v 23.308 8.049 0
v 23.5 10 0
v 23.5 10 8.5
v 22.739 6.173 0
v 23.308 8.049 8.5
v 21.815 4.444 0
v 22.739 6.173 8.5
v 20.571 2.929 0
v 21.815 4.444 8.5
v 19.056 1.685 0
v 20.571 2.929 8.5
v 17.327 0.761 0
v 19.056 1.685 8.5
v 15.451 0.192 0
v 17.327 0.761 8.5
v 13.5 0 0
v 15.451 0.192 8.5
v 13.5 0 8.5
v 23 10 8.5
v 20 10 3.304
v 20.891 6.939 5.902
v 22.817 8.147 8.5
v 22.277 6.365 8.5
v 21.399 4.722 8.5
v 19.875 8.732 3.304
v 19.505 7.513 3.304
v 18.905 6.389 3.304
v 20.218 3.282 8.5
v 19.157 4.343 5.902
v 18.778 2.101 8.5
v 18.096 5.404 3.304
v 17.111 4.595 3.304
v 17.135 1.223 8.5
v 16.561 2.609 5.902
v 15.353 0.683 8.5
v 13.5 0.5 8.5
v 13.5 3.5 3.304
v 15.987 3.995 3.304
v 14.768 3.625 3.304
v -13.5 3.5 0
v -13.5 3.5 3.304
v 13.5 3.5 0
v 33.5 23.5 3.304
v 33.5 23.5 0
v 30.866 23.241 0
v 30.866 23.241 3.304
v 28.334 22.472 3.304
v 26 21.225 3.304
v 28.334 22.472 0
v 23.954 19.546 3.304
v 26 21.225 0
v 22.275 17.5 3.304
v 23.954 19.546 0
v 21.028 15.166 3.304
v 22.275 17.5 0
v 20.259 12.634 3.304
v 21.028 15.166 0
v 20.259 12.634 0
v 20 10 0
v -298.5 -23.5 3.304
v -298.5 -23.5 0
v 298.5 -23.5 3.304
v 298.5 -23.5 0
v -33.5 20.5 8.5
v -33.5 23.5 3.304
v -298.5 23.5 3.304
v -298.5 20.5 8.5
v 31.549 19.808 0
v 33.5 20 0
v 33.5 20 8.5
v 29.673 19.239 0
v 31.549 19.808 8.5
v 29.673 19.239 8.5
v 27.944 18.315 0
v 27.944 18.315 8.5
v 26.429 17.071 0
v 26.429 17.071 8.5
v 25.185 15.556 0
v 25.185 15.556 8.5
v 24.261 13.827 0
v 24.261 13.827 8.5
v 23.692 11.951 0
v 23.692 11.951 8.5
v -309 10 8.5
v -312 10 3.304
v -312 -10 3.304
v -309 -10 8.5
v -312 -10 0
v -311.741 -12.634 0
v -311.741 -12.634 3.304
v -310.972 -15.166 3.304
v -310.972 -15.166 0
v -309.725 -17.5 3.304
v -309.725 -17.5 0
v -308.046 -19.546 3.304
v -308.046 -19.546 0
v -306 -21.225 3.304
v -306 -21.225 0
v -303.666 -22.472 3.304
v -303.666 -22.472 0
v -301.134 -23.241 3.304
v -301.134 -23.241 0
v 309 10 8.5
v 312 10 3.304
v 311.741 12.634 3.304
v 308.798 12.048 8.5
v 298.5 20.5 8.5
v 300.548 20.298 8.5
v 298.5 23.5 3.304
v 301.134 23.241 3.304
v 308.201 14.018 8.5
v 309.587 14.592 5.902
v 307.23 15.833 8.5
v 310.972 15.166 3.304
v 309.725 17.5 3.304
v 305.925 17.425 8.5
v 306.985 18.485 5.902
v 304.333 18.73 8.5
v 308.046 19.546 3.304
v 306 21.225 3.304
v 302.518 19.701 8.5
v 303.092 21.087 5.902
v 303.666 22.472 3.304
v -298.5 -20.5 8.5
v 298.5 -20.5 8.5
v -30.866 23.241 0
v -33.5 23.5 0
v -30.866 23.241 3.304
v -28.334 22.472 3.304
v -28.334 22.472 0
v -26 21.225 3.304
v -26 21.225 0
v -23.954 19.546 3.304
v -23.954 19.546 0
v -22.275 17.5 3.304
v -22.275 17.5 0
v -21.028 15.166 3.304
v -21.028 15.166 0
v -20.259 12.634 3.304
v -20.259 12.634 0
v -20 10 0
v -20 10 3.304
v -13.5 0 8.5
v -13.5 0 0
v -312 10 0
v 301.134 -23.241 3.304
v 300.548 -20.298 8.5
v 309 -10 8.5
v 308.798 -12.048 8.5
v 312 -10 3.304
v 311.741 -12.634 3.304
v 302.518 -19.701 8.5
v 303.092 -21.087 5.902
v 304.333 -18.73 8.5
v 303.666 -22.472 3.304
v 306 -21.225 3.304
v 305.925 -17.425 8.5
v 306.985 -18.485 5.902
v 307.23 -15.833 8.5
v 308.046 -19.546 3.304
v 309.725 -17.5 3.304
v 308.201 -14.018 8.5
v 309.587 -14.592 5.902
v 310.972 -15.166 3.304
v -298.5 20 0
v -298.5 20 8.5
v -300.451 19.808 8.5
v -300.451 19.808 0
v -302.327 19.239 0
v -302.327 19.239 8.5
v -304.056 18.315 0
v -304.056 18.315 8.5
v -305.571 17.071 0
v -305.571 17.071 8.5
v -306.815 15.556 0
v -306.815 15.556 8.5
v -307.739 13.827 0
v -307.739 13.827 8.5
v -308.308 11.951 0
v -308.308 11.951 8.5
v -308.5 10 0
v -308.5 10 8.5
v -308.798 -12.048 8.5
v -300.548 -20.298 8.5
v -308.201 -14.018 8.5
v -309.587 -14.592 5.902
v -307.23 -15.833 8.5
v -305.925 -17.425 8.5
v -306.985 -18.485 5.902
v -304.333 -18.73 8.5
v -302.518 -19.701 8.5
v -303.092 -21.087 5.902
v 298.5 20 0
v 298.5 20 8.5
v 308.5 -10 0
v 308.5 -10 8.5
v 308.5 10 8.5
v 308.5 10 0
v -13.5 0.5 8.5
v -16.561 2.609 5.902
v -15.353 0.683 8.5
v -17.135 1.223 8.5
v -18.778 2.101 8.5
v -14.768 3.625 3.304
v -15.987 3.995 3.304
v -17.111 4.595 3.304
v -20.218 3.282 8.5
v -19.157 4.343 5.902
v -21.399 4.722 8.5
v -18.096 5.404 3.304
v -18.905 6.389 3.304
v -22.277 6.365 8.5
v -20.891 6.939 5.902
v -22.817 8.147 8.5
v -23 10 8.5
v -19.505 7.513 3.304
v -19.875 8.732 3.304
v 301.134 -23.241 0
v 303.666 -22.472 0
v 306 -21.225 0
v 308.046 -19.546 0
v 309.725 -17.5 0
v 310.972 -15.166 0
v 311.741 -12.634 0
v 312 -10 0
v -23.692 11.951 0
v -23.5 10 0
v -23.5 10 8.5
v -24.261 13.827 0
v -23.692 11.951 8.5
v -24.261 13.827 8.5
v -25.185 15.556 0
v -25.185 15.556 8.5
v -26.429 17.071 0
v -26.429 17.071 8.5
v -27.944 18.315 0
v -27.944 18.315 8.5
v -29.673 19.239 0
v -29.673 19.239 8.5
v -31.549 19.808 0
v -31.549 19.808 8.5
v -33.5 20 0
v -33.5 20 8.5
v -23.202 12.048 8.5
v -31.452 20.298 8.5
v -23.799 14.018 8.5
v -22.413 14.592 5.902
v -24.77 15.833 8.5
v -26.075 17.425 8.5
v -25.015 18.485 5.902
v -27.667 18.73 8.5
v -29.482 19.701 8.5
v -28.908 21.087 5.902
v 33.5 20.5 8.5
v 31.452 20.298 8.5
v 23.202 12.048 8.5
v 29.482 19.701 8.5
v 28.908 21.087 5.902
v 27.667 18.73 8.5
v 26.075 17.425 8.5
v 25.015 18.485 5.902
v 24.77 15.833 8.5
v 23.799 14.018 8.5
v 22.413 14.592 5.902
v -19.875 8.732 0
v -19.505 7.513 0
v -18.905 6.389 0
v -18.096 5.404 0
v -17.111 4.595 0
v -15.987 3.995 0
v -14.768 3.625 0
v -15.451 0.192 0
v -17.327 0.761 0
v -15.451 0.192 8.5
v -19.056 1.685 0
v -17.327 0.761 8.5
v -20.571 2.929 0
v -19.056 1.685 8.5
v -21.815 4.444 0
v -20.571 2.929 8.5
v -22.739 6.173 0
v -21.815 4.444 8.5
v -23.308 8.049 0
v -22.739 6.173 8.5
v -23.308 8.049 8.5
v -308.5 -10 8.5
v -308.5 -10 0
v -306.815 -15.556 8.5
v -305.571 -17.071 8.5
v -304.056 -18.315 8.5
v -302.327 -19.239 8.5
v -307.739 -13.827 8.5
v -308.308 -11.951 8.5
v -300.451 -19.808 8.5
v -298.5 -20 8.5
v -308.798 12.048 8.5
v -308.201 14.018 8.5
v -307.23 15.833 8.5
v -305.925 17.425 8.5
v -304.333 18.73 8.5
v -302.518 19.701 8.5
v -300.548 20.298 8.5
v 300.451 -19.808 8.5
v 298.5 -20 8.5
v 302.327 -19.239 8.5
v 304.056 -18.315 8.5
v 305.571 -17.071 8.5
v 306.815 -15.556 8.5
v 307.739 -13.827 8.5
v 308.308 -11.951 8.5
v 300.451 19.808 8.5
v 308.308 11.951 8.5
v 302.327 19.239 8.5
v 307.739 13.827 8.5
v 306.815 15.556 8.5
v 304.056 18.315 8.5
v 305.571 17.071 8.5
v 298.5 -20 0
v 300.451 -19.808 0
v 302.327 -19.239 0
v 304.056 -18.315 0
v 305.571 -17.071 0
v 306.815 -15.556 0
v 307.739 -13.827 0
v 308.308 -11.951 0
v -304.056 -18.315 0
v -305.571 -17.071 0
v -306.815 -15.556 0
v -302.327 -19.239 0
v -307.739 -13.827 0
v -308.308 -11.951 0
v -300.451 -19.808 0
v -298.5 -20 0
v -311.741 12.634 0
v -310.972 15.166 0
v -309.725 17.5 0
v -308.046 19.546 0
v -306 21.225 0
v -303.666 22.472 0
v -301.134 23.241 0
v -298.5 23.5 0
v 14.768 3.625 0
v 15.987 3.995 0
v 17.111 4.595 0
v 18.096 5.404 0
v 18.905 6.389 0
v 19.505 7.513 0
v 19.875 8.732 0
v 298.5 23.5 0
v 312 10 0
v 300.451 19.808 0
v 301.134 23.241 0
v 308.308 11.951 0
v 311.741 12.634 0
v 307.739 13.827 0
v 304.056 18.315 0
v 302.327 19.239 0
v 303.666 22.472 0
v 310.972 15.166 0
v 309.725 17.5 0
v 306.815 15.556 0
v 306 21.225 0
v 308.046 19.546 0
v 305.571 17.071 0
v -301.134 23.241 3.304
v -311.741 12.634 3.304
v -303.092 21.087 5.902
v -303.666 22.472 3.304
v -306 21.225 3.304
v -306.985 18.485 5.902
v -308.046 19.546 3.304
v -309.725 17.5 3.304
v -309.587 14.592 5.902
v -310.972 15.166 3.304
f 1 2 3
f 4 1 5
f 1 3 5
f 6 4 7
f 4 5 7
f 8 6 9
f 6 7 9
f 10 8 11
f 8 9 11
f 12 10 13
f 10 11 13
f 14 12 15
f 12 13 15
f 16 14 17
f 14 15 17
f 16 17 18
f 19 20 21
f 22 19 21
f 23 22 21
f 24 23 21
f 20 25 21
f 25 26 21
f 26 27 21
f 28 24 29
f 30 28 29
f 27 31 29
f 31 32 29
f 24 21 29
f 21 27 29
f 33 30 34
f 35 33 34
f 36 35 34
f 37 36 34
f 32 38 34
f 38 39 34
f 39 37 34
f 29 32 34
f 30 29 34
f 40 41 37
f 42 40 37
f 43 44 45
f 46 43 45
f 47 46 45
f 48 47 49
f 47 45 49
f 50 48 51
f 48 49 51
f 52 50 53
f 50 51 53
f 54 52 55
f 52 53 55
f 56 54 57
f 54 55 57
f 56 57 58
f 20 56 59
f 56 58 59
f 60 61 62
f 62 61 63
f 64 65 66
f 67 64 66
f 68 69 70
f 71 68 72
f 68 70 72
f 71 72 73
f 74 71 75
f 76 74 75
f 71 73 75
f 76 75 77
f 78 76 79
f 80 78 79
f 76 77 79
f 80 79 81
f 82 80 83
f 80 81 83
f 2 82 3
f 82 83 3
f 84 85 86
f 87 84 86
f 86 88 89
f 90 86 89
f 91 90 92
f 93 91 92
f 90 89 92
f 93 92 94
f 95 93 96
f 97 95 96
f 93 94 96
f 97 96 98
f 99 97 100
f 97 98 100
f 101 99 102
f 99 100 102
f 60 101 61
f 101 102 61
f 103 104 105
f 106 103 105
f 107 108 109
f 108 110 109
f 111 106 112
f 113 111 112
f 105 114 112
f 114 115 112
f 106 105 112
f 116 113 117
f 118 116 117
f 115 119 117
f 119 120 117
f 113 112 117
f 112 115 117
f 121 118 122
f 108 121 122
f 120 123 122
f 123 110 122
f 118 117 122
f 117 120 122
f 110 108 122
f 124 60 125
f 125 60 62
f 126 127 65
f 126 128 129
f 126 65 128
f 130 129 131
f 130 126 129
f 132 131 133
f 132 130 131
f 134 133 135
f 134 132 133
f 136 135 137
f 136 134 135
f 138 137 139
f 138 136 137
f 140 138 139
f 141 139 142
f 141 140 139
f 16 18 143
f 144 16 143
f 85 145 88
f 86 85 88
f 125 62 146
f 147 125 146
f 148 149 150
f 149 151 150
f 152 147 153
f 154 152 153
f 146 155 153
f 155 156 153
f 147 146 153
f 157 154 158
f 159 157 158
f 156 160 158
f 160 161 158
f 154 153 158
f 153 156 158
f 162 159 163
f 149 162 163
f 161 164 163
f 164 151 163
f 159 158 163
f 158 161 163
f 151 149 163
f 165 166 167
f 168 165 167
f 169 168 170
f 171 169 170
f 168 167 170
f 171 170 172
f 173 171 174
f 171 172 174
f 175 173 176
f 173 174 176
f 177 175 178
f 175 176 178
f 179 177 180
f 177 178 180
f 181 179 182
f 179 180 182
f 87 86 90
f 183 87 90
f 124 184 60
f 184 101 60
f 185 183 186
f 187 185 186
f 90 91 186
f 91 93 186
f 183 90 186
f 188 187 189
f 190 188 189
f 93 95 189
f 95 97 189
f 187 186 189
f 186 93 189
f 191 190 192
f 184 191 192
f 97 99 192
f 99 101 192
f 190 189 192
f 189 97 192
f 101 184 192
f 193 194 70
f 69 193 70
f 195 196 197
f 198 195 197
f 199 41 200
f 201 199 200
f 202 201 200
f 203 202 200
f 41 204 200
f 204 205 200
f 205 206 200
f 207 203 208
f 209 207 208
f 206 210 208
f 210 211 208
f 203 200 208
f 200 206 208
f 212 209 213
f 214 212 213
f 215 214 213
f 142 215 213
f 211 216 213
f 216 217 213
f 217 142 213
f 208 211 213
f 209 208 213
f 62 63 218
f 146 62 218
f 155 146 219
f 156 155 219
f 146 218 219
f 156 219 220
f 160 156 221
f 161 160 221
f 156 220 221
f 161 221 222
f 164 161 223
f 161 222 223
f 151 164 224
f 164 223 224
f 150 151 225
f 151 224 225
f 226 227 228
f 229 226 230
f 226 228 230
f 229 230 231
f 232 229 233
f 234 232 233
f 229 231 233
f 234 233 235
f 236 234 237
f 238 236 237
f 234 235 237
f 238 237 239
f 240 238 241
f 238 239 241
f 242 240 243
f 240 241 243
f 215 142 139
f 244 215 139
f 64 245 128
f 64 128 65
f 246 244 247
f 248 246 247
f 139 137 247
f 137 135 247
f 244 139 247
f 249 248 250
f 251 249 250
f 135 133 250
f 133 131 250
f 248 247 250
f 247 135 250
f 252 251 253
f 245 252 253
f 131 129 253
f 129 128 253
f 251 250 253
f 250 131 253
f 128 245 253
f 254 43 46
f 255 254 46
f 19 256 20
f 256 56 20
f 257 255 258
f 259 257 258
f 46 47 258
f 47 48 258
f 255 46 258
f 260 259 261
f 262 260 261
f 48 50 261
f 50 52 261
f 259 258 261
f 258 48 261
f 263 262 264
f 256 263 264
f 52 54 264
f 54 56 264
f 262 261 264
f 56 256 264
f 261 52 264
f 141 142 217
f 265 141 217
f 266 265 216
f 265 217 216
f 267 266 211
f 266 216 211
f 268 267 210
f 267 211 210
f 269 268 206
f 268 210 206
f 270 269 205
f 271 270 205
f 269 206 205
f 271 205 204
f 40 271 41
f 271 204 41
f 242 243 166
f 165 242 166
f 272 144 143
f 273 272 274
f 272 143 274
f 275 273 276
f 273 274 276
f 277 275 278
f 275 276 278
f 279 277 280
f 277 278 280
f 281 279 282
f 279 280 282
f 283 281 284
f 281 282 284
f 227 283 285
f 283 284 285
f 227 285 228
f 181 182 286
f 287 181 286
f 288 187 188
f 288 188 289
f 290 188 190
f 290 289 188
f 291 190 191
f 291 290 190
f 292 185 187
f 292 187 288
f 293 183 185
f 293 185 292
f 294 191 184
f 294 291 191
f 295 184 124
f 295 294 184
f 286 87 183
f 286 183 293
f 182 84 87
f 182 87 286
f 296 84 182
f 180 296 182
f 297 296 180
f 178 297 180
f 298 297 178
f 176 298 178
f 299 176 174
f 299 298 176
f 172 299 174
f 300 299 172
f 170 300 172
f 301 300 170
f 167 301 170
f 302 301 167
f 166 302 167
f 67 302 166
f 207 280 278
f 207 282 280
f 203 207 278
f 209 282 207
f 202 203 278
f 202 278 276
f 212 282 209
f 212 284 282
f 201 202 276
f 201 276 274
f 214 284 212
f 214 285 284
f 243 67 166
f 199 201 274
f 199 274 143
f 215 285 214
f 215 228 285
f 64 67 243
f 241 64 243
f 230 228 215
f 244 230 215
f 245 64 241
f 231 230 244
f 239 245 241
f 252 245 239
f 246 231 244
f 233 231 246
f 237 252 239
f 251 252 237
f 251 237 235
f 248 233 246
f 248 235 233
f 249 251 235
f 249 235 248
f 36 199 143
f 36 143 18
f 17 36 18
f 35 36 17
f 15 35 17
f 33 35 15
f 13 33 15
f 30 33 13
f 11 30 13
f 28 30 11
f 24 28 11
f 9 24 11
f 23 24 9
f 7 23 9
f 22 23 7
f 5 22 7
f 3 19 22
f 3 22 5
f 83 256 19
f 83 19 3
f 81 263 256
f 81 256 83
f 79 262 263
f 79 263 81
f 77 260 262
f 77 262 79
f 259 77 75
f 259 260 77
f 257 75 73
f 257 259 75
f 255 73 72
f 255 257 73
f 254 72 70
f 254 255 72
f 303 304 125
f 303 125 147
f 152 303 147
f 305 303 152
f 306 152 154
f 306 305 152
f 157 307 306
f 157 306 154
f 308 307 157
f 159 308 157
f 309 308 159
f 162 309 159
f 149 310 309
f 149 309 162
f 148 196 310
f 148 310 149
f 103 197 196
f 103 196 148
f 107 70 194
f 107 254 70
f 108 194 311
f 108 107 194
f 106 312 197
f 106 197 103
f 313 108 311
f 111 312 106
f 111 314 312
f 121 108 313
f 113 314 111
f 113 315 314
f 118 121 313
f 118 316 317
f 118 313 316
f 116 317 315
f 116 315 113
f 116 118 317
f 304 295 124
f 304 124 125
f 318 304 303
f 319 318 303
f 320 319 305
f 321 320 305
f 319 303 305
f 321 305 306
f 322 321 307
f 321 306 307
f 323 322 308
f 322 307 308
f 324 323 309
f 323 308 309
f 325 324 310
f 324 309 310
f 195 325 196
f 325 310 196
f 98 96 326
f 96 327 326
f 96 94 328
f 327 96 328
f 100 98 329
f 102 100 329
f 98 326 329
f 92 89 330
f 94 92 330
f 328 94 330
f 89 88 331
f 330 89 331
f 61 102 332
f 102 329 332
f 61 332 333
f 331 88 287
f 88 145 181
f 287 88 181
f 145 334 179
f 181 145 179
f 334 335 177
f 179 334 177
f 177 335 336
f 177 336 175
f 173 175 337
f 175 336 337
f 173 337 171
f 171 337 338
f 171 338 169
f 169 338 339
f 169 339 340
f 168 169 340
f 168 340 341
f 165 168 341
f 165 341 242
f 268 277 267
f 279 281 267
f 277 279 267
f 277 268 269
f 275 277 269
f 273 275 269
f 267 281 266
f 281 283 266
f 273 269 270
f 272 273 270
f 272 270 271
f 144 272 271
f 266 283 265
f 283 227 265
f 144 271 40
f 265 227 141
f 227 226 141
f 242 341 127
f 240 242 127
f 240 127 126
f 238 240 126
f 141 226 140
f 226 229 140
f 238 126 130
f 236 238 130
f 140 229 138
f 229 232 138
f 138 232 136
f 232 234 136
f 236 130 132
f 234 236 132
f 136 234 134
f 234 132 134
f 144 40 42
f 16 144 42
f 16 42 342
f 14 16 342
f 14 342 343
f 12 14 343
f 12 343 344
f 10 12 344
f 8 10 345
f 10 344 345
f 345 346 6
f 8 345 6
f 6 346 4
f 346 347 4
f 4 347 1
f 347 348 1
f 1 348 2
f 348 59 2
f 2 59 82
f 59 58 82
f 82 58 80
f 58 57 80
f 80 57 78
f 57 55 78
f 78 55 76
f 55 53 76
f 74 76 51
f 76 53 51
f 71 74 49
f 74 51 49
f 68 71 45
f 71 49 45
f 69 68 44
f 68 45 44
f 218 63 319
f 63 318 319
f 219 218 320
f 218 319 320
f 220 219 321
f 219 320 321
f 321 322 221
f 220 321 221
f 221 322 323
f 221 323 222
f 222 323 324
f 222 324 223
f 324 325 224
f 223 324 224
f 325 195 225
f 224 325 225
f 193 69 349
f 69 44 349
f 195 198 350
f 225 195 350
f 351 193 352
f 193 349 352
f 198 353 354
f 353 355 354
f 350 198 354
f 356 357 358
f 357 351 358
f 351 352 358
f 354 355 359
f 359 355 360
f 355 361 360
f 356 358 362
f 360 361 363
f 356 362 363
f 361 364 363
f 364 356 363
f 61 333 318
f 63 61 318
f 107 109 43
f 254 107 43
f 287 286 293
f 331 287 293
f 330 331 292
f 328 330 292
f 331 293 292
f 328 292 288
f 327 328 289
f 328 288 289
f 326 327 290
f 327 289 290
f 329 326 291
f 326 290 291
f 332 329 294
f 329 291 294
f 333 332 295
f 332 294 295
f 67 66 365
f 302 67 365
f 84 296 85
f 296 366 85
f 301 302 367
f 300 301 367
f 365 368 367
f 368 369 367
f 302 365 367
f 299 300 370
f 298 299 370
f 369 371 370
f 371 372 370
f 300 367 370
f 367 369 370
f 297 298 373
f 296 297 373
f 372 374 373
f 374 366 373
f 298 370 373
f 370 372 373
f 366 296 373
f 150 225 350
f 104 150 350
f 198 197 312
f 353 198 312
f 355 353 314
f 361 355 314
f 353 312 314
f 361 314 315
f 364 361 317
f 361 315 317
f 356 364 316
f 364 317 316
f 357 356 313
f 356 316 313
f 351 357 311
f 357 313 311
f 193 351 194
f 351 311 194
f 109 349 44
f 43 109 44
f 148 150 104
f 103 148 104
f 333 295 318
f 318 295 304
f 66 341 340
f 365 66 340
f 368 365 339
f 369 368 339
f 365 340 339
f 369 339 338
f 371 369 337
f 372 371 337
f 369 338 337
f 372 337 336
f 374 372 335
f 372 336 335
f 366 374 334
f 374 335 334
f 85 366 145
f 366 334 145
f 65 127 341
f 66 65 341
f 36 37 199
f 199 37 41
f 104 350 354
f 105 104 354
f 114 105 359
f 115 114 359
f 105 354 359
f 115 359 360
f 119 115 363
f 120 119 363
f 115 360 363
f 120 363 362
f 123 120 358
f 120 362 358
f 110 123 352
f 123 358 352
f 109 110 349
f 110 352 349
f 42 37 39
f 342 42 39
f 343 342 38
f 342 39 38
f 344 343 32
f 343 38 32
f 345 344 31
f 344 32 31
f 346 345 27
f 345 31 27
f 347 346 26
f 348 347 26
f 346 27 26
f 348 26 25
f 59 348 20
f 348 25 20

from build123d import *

# Parameters (mm, degrees)
F1_DEPTH = 8.5
F3_DEPTH = 8.501
F5_DEPTH = 8.501
F6_R     = 13.49999
F7_SIZE2 = 5.1961524227
F7_SIZE  = 3


# Not quite as in the source:
# - a fillet or chamfer is up to 0.001 mm smaller than in the source, because OpenCascade refuses the exact size


with BuildPart() as f1:
    # F0 (on Top) → F1 (new body)
    with BuildSketch(Plane.XY):
        with BuildLine():
            Line((-298.5, -23.5), (298.5, -23.5))
            ThreePointArc((298.5, -23.5), (308.045941546, -19.545941546), (312, -10))
            Line((312, -10), (312, 10))
            ThreePointArc((312, 10), (308.045941546, 19.545941546), (298.5, 23.5))
            Line((298.5, 23.5), (-298.5, 23.5))
            ThreePointArc((-298.5, 23.5), (-308.045941546, 19.545941546), (-312, 10))
            Line((-312, 10), (-312, -10))
            ThreePointArc((-312, -10), (-308.045941546, -19.545941546), (-298.5, -23.5))
        make_face()
    extrude(amount=F1_DEPTH)

    # F2 (on face) → F3 (cut, through all)
    with BuildSketch(Plane.XY.offset(8.5)):
        with BuildLine():
            Line((-13.5, 3.5), (13.5, 3.5))
            ThreePointArc((13.5, 3.5), (18.0961940777, 5.4038059223), (20, 10))
            Line((20, 10), (20, 23.5))
            Line((20, 23.5), (-20, 23.5))
            Line((-20, 23.5), (-20, 10))
            ThreePointArc((-20, 10), (-18.0961940777, 5.4038059223), (-13.5, 3.5))
        make_face()
    extrude(amount=-F3_DEPTH, mode=Mode.SUBTRACT)

    # F4 (on face) → F5 (cut, through all)
    with BuildSketch(Plane.XY.offset(8.5)):
        with BuildLine():
            Line((-308.5, 10), (-308.5, -10))
            ThreePointArc((-308.5, -10), (-305.5710678119, -17.0710678119), (-298.5, -20))
            Line((-298.5, -20), (298.5, -20))
            ThreePointArc((298.5, -20), (305.5710678119, -17.0710678119), (308.5, -10))
            Line((308.5, -10), (308.5, 10))
            ThreePointArc((308.5, 10), (305.5710678119, 17.0710678119), (298.5, 20))
            Line((298.5, 20), (33.5, 20))
            ThreePointArc((33.5, 20), (26.4289321881, 17.0710678119), (23.5, 10))
            ThreePointArc((23.5, 10), (20.5710678119, 2.9289321881), (13.5, 0))
            Line((13.5, 0), (-13.5, 0))
            ThreePointArc((-13.5, 0), (-20.5710678119, 2.9289321881), (-23.5, 10))
            ThreePointArc((-23.5, 10), (-26.4289321881, 17.0710678119), (-33.5, 20))
            Line((-33.5, 20), (-298.5, 20))
            ThreePointArc((-298.5, 20), (-305.5710678119, 17.0710678119), (-308.5, 10))
        make_face()
    extrude(amount=-F5_DEPTH, mode=Mode.SUBTRACT)

    # F6 (radius 13.5 in the source; OpenCascade refuses exactly that, so slightly less here)
    f6_edges = [f1.edges().sort_by_distance(p)[0] for p in [
        (-20, 23.5, 4.25),
        (20, 23.5, 4.25),
    ]]
    fillet(f6_edges, radius=F6_R)

    # F7
    f7_edges = [f1.edges().sort_by_distance(p)[0] for p in [
        (165.999995, 23.5, 8.5),
    ]]
    f7_side = f1.faces().sort_by_distance((-165.999995, 22.874232, 8.5))[0]
    chamfer(f7_edges, length=F7_SIZE, length2=F7_SIZE2, reference=f7_side)


solid = f1.part
